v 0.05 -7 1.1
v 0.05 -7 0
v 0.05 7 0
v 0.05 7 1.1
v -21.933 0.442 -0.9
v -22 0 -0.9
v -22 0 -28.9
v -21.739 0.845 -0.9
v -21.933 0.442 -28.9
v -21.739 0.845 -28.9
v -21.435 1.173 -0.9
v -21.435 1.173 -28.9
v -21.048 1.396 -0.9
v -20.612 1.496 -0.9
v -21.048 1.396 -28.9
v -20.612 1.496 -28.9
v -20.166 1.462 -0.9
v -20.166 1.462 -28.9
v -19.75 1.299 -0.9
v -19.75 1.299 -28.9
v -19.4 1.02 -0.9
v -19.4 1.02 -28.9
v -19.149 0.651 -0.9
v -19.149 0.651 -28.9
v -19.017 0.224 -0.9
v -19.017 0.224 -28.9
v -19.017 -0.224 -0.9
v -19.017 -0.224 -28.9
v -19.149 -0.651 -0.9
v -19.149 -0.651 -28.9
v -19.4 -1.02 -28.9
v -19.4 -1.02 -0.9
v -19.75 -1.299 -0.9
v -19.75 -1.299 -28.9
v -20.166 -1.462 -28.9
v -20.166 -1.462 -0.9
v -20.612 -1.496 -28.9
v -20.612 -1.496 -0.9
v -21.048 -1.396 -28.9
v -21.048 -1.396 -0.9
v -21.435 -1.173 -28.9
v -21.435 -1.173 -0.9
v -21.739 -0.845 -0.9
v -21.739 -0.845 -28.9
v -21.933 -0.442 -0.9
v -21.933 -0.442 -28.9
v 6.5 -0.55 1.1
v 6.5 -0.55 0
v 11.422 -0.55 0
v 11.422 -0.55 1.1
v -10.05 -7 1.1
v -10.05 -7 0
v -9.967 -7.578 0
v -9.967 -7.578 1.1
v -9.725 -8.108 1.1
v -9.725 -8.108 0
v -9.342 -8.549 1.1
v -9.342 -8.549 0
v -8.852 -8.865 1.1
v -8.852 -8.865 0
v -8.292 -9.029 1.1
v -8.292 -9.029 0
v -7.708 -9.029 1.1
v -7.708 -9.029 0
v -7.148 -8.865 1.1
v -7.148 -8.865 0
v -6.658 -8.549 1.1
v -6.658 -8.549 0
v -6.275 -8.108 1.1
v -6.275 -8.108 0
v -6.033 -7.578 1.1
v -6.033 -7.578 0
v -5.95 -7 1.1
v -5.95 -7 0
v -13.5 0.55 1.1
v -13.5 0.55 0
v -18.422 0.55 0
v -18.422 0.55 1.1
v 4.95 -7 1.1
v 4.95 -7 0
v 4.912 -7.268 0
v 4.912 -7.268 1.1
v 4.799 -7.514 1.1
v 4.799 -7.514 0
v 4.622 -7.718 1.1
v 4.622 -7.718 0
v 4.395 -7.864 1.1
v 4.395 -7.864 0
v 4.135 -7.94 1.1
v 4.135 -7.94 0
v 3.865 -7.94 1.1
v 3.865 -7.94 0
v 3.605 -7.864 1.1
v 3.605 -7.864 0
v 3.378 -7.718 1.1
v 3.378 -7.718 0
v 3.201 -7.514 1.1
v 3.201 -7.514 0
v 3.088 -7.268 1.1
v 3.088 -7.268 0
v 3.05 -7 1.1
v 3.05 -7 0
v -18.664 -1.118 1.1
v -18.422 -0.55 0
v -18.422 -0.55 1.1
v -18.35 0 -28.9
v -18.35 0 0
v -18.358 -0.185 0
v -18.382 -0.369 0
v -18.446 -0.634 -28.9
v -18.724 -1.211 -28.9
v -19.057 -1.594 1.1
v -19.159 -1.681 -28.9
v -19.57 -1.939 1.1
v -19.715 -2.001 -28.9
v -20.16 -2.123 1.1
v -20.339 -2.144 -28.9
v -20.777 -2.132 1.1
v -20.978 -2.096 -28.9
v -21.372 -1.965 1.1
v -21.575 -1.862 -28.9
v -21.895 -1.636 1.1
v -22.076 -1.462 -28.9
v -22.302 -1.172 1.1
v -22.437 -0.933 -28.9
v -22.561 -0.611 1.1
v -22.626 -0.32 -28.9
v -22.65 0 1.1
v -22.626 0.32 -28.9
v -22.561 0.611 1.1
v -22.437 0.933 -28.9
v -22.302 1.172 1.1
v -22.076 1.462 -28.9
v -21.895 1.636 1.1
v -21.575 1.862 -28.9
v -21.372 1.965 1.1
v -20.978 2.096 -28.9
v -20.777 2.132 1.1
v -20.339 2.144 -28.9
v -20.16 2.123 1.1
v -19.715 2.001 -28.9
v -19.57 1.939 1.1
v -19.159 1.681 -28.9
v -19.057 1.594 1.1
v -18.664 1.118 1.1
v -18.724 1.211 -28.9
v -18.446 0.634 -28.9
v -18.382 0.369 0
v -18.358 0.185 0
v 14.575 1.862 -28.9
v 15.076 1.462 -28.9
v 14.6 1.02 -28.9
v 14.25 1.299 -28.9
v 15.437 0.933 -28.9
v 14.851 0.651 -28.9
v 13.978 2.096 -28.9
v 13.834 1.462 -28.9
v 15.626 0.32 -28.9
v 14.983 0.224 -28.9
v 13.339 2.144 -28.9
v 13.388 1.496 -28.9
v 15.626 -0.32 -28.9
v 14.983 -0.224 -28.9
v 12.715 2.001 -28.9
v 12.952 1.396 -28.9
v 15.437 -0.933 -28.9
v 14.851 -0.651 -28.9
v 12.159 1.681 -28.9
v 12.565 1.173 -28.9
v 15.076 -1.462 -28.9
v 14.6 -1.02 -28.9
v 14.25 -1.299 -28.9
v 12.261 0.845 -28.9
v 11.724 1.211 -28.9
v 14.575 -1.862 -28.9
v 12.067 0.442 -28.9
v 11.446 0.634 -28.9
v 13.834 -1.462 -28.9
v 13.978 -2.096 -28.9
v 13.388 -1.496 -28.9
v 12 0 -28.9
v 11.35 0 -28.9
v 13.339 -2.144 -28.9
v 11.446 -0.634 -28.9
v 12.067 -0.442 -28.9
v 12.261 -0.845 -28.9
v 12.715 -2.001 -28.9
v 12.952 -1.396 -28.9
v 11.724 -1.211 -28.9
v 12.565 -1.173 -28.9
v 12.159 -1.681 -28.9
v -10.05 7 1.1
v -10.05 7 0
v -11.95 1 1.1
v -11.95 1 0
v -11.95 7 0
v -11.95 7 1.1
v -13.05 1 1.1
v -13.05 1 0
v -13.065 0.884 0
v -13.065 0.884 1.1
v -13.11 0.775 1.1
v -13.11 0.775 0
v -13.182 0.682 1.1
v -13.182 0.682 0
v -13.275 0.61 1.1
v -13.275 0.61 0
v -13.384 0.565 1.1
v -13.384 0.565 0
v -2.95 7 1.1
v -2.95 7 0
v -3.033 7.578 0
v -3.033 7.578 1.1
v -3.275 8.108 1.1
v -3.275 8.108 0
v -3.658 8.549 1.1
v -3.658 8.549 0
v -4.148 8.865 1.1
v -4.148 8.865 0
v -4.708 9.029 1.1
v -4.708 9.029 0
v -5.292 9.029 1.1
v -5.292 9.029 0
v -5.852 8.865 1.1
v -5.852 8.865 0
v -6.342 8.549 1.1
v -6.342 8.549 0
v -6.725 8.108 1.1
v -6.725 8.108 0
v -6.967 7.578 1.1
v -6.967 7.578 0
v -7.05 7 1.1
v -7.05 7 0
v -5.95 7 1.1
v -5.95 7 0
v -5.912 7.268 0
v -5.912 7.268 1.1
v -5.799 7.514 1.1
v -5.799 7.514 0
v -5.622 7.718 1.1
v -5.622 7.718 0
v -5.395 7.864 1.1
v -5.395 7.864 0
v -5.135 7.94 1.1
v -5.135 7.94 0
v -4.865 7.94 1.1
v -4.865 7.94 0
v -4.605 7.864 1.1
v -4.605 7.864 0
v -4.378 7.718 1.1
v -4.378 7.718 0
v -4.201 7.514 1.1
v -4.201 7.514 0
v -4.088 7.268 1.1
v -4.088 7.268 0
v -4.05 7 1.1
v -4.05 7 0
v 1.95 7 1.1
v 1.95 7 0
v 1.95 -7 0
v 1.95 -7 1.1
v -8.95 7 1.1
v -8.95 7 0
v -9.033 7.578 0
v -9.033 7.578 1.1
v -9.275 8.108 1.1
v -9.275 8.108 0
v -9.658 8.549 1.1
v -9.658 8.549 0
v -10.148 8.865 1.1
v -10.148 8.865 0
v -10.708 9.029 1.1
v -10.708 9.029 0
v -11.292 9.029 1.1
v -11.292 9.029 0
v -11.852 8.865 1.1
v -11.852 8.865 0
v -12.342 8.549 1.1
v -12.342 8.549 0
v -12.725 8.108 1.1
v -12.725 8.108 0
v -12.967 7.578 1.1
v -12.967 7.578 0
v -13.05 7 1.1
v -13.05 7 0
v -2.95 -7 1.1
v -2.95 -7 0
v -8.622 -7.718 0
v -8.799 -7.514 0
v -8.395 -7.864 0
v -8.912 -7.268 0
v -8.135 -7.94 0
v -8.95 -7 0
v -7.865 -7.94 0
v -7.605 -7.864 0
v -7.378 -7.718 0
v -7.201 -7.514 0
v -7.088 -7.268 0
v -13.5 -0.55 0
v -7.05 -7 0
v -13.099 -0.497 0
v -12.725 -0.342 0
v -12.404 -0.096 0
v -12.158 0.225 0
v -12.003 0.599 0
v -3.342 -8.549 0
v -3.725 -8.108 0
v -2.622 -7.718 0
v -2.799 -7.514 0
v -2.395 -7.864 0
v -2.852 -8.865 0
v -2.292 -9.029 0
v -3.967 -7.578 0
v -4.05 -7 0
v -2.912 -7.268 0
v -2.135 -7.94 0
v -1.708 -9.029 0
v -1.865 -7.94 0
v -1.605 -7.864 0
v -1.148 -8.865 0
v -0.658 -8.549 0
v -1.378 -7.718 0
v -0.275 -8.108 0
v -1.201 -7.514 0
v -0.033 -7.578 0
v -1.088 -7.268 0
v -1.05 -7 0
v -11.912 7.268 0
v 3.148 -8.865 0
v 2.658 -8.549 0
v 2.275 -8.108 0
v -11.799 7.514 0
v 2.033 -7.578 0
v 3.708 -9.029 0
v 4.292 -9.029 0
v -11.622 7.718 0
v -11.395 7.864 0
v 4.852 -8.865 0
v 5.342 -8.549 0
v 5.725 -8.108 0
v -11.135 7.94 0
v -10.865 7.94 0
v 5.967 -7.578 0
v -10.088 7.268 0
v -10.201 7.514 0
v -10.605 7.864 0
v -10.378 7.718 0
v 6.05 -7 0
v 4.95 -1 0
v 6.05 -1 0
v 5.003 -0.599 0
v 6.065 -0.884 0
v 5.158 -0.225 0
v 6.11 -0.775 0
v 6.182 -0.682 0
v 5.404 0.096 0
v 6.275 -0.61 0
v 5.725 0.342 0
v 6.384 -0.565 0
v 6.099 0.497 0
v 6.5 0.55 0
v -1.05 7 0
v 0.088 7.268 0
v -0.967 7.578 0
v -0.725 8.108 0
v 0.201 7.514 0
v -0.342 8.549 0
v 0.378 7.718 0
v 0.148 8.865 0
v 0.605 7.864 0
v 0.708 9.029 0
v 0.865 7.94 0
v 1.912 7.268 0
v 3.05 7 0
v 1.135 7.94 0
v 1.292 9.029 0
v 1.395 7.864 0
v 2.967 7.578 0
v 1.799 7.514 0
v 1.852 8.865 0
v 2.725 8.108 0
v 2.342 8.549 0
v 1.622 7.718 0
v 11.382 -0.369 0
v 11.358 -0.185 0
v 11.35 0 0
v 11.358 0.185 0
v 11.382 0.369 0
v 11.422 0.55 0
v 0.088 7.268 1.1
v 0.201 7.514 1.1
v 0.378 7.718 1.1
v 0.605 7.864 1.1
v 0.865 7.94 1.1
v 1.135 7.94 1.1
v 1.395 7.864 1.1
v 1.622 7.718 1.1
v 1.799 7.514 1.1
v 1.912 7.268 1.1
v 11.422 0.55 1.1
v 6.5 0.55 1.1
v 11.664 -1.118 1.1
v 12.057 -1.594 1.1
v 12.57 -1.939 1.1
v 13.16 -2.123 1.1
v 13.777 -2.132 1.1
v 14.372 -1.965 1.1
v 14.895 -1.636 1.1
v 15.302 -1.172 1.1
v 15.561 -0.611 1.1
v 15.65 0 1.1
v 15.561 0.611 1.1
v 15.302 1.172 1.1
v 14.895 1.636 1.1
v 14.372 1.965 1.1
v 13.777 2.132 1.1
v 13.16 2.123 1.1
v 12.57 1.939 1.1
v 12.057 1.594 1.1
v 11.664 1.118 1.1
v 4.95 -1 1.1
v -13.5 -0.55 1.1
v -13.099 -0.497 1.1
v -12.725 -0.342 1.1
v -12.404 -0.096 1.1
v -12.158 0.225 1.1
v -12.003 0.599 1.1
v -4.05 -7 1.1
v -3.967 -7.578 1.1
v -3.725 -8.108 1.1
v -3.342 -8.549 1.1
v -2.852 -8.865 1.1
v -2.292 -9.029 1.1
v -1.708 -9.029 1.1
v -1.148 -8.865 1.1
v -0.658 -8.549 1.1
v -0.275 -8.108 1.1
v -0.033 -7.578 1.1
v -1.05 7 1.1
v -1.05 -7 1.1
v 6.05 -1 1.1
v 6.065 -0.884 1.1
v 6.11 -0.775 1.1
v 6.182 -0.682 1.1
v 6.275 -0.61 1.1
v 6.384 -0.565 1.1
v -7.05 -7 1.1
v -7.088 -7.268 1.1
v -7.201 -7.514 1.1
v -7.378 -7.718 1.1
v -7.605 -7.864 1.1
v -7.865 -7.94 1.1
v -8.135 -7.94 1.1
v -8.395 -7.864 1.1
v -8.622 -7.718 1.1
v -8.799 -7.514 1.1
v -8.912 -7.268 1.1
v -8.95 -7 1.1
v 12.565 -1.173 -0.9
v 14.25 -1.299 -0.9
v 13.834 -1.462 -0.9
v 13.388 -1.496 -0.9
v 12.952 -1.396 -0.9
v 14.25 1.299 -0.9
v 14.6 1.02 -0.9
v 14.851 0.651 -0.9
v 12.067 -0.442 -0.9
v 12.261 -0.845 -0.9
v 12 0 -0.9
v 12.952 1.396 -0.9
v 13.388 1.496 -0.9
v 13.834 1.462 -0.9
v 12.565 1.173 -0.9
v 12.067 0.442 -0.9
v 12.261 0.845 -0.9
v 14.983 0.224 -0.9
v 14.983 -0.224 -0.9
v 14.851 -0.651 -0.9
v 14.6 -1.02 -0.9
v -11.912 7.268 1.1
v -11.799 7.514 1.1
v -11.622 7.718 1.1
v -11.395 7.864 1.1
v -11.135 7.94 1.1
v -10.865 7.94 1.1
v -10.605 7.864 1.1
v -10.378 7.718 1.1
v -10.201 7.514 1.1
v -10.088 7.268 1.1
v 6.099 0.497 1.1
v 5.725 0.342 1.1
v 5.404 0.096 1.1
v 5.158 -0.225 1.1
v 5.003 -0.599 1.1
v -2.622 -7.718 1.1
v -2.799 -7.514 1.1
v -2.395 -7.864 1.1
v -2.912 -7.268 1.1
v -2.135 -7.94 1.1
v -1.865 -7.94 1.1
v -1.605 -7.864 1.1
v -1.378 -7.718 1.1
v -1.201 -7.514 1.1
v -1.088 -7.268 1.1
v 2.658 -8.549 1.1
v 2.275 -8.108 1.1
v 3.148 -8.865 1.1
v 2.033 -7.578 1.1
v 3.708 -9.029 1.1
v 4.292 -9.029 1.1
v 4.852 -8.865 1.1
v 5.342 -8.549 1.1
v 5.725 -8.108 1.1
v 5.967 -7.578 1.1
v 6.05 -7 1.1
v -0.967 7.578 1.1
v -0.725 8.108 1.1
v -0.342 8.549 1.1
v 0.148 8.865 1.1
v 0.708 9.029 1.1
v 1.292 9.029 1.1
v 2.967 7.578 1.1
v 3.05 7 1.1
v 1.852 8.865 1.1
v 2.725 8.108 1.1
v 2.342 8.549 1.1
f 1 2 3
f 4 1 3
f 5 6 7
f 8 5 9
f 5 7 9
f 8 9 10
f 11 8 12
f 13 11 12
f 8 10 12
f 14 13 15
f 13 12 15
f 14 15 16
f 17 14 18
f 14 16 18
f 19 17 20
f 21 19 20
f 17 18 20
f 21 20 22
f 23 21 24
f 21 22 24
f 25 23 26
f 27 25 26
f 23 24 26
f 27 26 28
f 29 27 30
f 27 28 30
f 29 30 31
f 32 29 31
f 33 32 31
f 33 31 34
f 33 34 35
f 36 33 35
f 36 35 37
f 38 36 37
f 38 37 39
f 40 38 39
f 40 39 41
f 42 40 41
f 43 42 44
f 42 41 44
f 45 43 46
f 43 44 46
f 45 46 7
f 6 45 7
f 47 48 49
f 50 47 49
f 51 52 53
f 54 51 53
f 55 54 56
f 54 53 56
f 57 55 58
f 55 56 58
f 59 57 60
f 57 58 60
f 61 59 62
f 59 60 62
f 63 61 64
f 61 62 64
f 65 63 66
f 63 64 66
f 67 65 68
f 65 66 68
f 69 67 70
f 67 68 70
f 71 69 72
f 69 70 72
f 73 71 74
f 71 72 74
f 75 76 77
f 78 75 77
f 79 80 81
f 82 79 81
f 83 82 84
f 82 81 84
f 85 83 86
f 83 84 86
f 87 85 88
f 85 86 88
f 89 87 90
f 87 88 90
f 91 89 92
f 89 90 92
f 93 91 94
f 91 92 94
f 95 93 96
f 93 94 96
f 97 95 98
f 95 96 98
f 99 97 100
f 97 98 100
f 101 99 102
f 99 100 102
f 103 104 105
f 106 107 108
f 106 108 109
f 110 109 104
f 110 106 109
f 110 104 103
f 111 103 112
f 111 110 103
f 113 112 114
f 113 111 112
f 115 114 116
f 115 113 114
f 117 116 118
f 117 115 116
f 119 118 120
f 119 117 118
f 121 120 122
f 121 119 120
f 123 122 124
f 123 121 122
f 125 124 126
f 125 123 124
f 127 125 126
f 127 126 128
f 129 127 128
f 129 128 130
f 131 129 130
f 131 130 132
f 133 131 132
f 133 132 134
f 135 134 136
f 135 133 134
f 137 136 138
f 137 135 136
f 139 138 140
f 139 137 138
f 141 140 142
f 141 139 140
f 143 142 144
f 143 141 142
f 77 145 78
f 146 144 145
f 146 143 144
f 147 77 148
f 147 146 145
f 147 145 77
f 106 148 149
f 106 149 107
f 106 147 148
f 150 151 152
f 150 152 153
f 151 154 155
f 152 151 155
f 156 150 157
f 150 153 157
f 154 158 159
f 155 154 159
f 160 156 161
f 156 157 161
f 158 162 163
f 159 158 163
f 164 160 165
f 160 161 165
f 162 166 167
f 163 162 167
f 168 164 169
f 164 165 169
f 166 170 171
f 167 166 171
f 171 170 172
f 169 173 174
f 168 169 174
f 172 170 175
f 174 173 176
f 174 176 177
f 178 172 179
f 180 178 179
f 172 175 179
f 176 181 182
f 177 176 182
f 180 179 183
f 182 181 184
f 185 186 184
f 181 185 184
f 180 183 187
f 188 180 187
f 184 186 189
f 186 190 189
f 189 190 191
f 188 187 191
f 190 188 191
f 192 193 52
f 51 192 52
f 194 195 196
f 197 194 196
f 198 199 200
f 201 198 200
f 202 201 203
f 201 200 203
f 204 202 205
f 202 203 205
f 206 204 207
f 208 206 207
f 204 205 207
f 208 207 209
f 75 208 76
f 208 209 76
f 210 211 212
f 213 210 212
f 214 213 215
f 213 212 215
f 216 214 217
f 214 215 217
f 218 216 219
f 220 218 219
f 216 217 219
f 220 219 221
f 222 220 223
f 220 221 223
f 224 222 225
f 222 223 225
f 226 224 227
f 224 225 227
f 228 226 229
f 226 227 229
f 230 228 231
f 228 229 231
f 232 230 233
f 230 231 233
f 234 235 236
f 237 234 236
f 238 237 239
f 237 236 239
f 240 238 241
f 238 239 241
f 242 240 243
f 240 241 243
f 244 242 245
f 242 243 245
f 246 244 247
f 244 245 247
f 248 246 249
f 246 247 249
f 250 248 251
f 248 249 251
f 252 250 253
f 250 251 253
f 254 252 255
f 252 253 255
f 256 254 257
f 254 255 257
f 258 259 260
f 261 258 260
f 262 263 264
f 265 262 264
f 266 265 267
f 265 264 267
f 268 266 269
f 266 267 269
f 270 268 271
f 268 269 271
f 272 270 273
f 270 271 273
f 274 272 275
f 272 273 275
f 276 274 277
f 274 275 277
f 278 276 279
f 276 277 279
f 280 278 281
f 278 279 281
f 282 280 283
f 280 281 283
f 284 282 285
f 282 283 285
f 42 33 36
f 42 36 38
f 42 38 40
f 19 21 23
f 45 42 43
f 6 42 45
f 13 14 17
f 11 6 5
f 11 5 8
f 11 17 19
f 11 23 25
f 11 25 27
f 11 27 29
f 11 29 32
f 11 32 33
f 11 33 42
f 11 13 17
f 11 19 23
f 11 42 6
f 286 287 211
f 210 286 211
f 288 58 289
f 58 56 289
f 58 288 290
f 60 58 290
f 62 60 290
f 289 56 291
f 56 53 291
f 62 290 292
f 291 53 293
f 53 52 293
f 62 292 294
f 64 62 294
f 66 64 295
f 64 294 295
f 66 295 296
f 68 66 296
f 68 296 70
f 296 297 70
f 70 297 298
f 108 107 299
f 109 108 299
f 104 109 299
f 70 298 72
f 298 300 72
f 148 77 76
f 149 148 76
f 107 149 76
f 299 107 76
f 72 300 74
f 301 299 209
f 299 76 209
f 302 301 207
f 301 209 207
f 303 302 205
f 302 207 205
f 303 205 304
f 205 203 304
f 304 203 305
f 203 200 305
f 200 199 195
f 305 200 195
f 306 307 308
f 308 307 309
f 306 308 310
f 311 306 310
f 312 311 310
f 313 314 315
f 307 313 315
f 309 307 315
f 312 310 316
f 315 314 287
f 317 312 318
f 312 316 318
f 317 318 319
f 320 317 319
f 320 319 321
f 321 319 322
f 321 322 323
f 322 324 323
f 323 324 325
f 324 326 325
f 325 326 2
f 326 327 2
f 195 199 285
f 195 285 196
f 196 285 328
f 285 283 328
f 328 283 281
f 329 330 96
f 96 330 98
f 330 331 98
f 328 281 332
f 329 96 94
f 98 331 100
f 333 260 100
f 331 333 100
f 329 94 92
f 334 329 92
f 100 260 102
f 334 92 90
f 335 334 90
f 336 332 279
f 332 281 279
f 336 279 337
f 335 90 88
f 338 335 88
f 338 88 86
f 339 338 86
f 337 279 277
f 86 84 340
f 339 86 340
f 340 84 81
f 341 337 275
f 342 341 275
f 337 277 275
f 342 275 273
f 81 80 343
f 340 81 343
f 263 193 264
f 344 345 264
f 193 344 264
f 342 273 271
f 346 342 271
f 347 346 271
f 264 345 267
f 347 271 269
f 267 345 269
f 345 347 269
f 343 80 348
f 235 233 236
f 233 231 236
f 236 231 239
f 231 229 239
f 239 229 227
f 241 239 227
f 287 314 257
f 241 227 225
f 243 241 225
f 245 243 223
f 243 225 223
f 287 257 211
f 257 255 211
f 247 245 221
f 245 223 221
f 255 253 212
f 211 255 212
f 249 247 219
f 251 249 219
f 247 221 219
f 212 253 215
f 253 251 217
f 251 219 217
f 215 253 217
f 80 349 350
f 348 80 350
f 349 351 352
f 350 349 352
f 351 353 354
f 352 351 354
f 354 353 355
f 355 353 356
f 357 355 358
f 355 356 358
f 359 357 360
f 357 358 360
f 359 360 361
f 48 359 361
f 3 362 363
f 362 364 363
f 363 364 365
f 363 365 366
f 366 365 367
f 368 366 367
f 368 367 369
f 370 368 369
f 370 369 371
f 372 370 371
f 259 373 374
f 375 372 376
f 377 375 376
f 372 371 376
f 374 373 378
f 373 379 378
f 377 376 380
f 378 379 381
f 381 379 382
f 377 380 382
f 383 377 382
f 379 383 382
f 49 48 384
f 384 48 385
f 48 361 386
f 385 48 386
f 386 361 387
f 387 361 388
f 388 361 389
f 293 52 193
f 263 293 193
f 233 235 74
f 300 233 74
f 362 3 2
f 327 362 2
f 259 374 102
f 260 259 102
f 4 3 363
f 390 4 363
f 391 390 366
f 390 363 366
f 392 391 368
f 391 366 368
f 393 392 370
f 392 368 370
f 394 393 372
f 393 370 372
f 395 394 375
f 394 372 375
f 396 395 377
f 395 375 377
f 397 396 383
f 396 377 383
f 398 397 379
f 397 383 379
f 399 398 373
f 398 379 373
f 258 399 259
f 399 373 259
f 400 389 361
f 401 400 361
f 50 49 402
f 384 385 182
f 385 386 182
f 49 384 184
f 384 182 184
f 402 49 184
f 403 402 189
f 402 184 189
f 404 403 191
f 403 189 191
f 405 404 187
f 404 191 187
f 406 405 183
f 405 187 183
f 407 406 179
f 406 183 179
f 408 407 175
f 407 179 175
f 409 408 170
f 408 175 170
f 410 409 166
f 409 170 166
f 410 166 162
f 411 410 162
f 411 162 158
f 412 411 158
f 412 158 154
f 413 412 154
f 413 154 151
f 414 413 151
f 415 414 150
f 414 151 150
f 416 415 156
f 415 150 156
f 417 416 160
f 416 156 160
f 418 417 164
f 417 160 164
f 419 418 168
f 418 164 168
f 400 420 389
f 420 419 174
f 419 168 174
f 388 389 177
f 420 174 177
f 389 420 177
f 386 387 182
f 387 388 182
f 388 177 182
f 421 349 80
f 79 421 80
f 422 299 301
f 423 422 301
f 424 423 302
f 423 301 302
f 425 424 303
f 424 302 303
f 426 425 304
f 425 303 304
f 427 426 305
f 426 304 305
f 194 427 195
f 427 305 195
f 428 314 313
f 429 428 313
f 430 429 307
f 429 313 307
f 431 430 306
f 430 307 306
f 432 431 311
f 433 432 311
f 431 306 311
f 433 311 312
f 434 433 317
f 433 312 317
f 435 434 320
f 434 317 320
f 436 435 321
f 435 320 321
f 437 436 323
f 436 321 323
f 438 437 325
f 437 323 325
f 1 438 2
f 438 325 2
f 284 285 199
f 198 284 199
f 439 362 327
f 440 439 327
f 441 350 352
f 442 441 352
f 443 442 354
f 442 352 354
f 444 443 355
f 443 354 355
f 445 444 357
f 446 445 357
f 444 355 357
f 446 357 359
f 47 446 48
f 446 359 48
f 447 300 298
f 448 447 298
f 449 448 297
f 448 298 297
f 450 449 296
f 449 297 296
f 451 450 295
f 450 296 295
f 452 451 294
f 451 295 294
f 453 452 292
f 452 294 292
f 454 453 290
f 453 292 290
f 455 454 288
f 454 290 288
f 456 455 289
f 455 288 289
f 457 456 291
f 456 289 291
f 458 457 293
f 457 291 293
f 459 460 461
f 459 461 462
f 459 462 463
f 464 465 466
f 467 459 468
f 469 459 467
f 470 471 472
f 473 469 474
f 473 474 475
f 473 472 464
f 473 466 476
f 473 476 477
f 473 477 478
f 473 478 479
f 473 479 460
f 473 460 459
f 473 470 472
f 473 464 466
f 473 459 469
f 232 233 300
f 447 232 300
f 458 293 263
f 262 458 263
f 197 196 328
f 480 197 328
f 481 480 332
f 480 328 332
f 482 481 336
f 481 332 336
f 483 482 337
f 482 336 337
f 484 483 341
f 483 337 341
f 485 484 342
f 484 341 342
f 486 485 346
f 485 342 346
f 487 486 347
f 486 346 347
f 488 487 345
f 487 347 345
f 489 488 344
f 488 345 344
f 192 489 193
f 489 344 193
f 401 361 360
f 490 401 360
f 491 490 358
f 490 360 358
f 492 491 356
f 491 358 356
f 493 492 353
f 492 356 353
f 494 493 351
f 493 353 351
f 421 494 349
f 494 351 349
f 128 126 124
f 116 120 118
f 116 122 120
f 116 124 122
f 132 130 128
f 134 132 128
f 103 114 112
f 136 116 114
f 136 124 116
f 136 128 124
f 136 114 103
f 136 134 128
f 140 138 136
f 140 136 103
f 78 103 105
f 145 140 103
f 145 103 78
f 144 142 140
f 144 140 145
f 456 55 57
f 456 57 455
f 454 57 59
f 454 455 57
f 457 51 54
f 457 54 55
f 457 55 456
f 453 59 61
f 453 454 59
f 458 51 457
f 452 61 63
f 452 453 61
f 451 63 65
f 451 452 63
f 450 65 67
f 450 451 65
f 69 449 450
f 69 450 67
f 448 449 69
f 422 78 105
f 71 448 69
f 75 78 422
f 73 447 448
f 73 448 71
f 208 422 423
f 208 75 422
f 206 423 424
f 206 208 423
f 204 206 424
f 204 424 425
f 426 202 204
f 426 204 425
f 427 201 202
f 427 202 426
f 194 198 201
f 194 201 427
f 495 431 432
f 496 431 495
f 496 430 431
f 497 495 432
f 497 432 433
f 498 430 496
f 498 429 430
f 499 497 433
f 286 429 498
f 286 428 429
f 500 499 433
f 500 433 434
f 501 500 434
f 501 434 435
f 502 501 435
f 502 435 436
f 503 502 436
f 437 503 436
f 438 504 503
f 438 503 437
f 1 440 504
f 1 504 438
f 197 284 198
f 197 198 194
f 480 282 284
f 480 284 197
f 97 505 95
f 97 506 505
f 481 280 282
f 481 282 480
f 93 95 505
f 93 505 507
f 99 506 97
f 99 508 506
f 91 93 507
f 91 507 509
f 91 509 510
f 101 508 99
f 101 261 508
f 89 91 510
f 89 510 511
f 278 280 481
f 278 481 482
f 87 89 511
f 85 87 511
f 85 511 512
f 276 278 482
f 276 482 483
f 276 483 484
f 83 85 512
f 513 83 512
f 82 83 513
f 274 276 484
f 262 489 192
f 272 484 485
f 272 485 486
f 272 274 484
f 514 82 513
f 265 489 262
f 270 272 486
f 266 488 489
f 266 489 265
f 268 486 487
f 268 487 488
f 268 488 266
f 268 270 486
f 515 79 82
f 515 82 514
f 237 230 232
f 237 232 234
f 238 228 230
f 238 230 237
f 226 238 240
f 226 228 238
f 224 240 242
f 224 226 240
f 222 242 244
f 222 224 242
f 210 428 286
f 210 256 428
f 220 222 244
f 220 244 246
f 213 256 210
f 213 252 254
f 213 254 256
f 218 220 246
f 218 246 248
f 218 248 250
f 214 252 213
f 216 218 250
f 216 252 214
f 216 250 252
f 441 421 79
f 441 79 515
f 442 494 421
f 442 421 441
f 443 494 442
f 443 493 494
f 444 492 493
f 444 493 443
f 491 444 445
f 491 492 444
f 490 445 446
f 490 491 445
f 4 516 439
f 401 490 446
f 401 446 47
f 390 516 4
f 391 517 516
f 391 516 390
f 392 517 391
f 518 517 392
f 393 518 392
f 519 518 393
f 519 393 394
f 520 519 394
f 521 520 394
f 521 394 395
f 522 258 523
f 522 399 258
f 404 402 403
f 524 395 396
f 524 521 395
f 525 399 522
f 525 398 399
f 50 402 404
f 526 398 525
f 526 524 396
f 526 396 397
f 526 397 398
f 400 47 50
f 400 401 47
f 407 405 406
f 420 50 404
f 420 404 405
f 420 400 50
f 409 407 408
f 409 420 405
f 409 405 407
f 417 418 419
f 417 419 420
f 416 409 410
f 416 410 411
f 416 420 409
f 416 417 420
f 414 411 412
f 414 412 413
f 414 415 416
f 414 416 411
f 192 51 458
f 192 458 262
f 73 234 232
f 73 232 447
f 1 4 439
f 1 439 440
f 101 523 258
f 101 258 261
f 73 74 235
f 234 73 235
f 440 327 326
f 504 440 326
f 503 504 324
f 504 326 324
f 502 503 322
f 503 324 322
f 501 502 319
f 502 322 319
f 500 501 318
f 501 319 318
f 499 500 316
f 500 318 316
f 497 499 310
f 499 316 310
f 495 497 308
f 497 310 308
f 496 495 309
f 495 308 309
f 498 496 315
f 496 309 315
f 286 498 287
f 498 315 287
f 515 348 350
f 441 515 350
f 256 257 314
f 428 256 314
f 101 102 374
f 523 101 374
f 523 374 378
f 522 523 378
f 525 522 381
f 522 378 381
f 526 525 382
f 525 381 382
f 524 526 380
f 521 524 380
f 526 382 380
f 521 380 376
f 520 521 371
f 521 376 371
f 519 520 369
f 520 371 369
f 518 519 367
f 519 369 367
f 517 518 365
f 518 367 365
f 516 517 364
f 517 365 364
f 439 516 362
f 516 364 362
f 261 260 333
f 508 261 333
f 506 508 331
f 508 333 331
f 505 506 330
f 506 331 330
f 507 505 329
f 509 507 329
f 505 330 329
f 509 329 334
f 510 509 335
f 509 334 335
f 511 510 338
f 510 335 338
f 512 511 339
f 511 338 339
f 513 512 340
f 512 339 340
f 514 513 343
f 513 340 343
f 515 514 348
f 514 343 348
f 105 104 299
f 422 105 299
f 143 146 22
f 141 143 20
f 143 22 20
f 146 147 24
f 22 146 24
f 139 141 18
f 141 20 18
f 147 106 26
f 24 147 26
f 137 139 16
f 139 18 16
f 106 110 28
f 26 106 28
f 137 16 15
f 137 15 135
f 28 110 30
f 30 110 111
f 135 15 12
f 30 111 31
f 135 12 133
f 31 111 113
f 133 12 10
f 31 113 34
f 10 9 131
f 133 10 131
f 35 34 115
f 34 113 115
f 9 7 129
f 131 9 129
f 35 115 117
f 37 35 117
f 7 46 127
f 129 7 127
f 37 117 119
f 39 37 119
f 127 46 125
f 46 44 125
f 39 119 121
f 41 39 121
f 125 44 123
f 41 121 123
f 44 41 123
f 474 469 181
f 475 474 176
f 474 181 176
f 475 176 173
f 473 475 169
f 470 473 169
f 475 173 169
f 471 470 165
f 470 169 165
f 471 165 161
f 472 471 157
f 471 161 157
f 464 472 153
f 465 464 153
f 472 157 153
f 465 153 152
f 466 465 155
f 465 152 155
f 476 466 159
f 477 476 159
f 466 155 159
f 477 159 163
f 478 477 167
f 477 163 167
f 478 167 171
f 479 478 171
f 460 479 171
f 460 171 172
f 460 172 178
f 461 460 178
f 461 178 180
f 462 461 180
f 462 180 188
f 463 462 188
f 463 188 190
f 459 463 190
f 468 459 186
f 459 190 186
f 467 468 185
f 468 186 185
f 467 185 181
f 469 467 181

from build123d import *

# Parameters (mm, degrees)
BOSS_EXTRUDE1_DEPTH = 1.1
SKETCH3_W           = 2.15
SKETCH3_H           = 30
SKETCH4_W           = 2.15
SKETCH4_H           = 30
SKETCH5_R           = 1.5
CUT_EXTRUDE1_DEPTH  = 28


with BuildPart() as part:
    # Sketch2 → Boss-Extrude1 (new body)
    with BuildSketch(Plane.XY):
        with BuildLine():
            Line((-20.5, -0.55), (-13.5, -0.55))
            ThreePointArc((-13.5, -0.55), (-12.403984489, -0.096015511), (-11.95, 1))
            Line((-11.95, 1), (-11.95, 7))
            ThreePointArc((-11.95, 7), (-11, 7.95), (-10.05, 7))
            Line((-10.05, 7), (-10.05, 0))
            Line((-10.05, 0), (-10.05, -7))
            ThreePointArc((-10.05, -7), (-8, -9.05), (-5.95, -7))
            Line((-5.95, -7), (-5.95, 0))
            Line((-5.95, 0), (-5.95, 7))
            ThreePointArc((-5.95, 7), (-5, 7.95), (-4.05, 7))
            Line((-4.05, 7), (-4.05, 0))
            Line((-4.05, 0), (-4.05, -7))
            ThreePointArc((-4.05, -7), (-2, -9.05), (0.05, -7))
            Line((0.05, -7), (0.05, 0))
            Line((0.05, 0), (0.05, 7))
            ThreePointArc((0.05, 7), (1, 7.95), (1.95, 7))
            Line((1.95, 7), (1.95, 0))
            Line((1.95, 0), (1.95, -7))
            ThreePointArc((1.95, -7), (4, -9.05), (6.05, -7))
            Line((6.05, -7), (6.05, -1))
            ThreePointArc((6.05, -1), (6.181801948, -0.681801948), (6.5, -0.55))
            Line((6.5, -0.55), (13.5, -0.55))
            ThreePointArc((13.5, -0.55), (14.05, 0), (13.5, 0.55))
            Line((13.5, 0.55), (6.5, 0.55))
            ThreePointArc((6.5, 0.55), (5.403984489, 0.096015511), (4.95, -1))
            Line((4.95, -1), (4.95, -7))
            ThreePointArc((4.95, -7), (4, -7.95), (3.05, -7))
            Line((3.05, -7), (3.05, 0))
            Line((3.05, 0), (3.05, 7))
            ThreePointArc((3.05, 7), (1, 9.05), (-1.05, 7))
            Line((-1.05, 7), (-1.05, 0))
            Line((-1.05, 0), (-1.05, -7))
            ThreePointArc((-1.05, -7), (-2, -7.95), (-2.95, -7))
            Line((-2.95, -7), (-2.95, 0))
            Line((-2.95, 0), (-2.95, 7))
            ThreePointArc((-2.95, 7), (-5, 9.05), (-7.05, 7))
            Line((-7.05, 7), (-7.05, 0))
            Line((-7.05, 0), (-7.05, -7))
            ThreePointArc((-7.05, -7), (-8, -7.95), (-8.95, -7))
            Line((-8.95, -7), (-8.95, 0))
            Line((-8.95, 0), (-8.95, 7))
            ThreePointArc((-8.95, 7), (-11, 9.05), (-13.05, 7))
            Line((-13.05, 7), (-13.05, 1))
            ThreePointArc((-13.05, 1), (-13.181801948, 0.681801948), (-13.5, 0.55))
            Line((-13.5, 0.55), (-20.5, 0.55))
            ThreePointArc((-20.5, 0.55), (-21.05, 0), (-20.5, -0.55))
        make_face()
    extrude(amount=BOSS_EXTRUDE1_DEPTH)

    # Sketch3 → Revolve1 (revolve)
    with BuildSketch(Plane(origin=(0, 0, 0), x_dir=(-1, 0, 0), z_dir=(0, -1, 0)), mode=Mode.PRIVATE) as revolve1_sk:
        with Locations((21.575, 13.9)):
            Rectangle(SKETCH3_W, SKETCH3_H)
    revolve(revolve1_sk.sketch.rotate(Axis((-20.5, 0, 1.1), (0, 0, -1)), 180), axis=Axis((-20.5, 0, 1.1), (0, 0, -1)))

    # Sketch4 → Revolve2 (revolve)
    with BuildSketch(Plane(origin=(0, 0, 0), x_dir=(-1, 0, 0), z_dir=(0, -1, 0)), mode=Mode.PRIVATE) as revolve2_sk:
        with Locations((-14.575, 13.9)):
            Rectangle(SKETCH4_W, SKETCH4_H)
    revolve(revolve2_sk.sketch.rotate(Axis((13.5, 0, -28.9), (0, 0, 1)), 180), axis=Axis((13.5, 0, -28.9), (0, 0, 1)))

    # Sketch5 → Cut-Extrude1 (cut)
    with BuildSketch(Plane(origin=(0, 0, -28.9), x_dir=(-1, 0, 0), z_dir=(0, 0, -1))):
        with Locations((20.5, 0)):
            Circle(SKETCH5_R)
        with Locations((-13.5, 0)):
            Circle(SKETCH5_R)
    extrude(amount=-CUT_EXTRUDE1_DEPTH, mode=Mode.SUBTRACT)


solid = part.part
